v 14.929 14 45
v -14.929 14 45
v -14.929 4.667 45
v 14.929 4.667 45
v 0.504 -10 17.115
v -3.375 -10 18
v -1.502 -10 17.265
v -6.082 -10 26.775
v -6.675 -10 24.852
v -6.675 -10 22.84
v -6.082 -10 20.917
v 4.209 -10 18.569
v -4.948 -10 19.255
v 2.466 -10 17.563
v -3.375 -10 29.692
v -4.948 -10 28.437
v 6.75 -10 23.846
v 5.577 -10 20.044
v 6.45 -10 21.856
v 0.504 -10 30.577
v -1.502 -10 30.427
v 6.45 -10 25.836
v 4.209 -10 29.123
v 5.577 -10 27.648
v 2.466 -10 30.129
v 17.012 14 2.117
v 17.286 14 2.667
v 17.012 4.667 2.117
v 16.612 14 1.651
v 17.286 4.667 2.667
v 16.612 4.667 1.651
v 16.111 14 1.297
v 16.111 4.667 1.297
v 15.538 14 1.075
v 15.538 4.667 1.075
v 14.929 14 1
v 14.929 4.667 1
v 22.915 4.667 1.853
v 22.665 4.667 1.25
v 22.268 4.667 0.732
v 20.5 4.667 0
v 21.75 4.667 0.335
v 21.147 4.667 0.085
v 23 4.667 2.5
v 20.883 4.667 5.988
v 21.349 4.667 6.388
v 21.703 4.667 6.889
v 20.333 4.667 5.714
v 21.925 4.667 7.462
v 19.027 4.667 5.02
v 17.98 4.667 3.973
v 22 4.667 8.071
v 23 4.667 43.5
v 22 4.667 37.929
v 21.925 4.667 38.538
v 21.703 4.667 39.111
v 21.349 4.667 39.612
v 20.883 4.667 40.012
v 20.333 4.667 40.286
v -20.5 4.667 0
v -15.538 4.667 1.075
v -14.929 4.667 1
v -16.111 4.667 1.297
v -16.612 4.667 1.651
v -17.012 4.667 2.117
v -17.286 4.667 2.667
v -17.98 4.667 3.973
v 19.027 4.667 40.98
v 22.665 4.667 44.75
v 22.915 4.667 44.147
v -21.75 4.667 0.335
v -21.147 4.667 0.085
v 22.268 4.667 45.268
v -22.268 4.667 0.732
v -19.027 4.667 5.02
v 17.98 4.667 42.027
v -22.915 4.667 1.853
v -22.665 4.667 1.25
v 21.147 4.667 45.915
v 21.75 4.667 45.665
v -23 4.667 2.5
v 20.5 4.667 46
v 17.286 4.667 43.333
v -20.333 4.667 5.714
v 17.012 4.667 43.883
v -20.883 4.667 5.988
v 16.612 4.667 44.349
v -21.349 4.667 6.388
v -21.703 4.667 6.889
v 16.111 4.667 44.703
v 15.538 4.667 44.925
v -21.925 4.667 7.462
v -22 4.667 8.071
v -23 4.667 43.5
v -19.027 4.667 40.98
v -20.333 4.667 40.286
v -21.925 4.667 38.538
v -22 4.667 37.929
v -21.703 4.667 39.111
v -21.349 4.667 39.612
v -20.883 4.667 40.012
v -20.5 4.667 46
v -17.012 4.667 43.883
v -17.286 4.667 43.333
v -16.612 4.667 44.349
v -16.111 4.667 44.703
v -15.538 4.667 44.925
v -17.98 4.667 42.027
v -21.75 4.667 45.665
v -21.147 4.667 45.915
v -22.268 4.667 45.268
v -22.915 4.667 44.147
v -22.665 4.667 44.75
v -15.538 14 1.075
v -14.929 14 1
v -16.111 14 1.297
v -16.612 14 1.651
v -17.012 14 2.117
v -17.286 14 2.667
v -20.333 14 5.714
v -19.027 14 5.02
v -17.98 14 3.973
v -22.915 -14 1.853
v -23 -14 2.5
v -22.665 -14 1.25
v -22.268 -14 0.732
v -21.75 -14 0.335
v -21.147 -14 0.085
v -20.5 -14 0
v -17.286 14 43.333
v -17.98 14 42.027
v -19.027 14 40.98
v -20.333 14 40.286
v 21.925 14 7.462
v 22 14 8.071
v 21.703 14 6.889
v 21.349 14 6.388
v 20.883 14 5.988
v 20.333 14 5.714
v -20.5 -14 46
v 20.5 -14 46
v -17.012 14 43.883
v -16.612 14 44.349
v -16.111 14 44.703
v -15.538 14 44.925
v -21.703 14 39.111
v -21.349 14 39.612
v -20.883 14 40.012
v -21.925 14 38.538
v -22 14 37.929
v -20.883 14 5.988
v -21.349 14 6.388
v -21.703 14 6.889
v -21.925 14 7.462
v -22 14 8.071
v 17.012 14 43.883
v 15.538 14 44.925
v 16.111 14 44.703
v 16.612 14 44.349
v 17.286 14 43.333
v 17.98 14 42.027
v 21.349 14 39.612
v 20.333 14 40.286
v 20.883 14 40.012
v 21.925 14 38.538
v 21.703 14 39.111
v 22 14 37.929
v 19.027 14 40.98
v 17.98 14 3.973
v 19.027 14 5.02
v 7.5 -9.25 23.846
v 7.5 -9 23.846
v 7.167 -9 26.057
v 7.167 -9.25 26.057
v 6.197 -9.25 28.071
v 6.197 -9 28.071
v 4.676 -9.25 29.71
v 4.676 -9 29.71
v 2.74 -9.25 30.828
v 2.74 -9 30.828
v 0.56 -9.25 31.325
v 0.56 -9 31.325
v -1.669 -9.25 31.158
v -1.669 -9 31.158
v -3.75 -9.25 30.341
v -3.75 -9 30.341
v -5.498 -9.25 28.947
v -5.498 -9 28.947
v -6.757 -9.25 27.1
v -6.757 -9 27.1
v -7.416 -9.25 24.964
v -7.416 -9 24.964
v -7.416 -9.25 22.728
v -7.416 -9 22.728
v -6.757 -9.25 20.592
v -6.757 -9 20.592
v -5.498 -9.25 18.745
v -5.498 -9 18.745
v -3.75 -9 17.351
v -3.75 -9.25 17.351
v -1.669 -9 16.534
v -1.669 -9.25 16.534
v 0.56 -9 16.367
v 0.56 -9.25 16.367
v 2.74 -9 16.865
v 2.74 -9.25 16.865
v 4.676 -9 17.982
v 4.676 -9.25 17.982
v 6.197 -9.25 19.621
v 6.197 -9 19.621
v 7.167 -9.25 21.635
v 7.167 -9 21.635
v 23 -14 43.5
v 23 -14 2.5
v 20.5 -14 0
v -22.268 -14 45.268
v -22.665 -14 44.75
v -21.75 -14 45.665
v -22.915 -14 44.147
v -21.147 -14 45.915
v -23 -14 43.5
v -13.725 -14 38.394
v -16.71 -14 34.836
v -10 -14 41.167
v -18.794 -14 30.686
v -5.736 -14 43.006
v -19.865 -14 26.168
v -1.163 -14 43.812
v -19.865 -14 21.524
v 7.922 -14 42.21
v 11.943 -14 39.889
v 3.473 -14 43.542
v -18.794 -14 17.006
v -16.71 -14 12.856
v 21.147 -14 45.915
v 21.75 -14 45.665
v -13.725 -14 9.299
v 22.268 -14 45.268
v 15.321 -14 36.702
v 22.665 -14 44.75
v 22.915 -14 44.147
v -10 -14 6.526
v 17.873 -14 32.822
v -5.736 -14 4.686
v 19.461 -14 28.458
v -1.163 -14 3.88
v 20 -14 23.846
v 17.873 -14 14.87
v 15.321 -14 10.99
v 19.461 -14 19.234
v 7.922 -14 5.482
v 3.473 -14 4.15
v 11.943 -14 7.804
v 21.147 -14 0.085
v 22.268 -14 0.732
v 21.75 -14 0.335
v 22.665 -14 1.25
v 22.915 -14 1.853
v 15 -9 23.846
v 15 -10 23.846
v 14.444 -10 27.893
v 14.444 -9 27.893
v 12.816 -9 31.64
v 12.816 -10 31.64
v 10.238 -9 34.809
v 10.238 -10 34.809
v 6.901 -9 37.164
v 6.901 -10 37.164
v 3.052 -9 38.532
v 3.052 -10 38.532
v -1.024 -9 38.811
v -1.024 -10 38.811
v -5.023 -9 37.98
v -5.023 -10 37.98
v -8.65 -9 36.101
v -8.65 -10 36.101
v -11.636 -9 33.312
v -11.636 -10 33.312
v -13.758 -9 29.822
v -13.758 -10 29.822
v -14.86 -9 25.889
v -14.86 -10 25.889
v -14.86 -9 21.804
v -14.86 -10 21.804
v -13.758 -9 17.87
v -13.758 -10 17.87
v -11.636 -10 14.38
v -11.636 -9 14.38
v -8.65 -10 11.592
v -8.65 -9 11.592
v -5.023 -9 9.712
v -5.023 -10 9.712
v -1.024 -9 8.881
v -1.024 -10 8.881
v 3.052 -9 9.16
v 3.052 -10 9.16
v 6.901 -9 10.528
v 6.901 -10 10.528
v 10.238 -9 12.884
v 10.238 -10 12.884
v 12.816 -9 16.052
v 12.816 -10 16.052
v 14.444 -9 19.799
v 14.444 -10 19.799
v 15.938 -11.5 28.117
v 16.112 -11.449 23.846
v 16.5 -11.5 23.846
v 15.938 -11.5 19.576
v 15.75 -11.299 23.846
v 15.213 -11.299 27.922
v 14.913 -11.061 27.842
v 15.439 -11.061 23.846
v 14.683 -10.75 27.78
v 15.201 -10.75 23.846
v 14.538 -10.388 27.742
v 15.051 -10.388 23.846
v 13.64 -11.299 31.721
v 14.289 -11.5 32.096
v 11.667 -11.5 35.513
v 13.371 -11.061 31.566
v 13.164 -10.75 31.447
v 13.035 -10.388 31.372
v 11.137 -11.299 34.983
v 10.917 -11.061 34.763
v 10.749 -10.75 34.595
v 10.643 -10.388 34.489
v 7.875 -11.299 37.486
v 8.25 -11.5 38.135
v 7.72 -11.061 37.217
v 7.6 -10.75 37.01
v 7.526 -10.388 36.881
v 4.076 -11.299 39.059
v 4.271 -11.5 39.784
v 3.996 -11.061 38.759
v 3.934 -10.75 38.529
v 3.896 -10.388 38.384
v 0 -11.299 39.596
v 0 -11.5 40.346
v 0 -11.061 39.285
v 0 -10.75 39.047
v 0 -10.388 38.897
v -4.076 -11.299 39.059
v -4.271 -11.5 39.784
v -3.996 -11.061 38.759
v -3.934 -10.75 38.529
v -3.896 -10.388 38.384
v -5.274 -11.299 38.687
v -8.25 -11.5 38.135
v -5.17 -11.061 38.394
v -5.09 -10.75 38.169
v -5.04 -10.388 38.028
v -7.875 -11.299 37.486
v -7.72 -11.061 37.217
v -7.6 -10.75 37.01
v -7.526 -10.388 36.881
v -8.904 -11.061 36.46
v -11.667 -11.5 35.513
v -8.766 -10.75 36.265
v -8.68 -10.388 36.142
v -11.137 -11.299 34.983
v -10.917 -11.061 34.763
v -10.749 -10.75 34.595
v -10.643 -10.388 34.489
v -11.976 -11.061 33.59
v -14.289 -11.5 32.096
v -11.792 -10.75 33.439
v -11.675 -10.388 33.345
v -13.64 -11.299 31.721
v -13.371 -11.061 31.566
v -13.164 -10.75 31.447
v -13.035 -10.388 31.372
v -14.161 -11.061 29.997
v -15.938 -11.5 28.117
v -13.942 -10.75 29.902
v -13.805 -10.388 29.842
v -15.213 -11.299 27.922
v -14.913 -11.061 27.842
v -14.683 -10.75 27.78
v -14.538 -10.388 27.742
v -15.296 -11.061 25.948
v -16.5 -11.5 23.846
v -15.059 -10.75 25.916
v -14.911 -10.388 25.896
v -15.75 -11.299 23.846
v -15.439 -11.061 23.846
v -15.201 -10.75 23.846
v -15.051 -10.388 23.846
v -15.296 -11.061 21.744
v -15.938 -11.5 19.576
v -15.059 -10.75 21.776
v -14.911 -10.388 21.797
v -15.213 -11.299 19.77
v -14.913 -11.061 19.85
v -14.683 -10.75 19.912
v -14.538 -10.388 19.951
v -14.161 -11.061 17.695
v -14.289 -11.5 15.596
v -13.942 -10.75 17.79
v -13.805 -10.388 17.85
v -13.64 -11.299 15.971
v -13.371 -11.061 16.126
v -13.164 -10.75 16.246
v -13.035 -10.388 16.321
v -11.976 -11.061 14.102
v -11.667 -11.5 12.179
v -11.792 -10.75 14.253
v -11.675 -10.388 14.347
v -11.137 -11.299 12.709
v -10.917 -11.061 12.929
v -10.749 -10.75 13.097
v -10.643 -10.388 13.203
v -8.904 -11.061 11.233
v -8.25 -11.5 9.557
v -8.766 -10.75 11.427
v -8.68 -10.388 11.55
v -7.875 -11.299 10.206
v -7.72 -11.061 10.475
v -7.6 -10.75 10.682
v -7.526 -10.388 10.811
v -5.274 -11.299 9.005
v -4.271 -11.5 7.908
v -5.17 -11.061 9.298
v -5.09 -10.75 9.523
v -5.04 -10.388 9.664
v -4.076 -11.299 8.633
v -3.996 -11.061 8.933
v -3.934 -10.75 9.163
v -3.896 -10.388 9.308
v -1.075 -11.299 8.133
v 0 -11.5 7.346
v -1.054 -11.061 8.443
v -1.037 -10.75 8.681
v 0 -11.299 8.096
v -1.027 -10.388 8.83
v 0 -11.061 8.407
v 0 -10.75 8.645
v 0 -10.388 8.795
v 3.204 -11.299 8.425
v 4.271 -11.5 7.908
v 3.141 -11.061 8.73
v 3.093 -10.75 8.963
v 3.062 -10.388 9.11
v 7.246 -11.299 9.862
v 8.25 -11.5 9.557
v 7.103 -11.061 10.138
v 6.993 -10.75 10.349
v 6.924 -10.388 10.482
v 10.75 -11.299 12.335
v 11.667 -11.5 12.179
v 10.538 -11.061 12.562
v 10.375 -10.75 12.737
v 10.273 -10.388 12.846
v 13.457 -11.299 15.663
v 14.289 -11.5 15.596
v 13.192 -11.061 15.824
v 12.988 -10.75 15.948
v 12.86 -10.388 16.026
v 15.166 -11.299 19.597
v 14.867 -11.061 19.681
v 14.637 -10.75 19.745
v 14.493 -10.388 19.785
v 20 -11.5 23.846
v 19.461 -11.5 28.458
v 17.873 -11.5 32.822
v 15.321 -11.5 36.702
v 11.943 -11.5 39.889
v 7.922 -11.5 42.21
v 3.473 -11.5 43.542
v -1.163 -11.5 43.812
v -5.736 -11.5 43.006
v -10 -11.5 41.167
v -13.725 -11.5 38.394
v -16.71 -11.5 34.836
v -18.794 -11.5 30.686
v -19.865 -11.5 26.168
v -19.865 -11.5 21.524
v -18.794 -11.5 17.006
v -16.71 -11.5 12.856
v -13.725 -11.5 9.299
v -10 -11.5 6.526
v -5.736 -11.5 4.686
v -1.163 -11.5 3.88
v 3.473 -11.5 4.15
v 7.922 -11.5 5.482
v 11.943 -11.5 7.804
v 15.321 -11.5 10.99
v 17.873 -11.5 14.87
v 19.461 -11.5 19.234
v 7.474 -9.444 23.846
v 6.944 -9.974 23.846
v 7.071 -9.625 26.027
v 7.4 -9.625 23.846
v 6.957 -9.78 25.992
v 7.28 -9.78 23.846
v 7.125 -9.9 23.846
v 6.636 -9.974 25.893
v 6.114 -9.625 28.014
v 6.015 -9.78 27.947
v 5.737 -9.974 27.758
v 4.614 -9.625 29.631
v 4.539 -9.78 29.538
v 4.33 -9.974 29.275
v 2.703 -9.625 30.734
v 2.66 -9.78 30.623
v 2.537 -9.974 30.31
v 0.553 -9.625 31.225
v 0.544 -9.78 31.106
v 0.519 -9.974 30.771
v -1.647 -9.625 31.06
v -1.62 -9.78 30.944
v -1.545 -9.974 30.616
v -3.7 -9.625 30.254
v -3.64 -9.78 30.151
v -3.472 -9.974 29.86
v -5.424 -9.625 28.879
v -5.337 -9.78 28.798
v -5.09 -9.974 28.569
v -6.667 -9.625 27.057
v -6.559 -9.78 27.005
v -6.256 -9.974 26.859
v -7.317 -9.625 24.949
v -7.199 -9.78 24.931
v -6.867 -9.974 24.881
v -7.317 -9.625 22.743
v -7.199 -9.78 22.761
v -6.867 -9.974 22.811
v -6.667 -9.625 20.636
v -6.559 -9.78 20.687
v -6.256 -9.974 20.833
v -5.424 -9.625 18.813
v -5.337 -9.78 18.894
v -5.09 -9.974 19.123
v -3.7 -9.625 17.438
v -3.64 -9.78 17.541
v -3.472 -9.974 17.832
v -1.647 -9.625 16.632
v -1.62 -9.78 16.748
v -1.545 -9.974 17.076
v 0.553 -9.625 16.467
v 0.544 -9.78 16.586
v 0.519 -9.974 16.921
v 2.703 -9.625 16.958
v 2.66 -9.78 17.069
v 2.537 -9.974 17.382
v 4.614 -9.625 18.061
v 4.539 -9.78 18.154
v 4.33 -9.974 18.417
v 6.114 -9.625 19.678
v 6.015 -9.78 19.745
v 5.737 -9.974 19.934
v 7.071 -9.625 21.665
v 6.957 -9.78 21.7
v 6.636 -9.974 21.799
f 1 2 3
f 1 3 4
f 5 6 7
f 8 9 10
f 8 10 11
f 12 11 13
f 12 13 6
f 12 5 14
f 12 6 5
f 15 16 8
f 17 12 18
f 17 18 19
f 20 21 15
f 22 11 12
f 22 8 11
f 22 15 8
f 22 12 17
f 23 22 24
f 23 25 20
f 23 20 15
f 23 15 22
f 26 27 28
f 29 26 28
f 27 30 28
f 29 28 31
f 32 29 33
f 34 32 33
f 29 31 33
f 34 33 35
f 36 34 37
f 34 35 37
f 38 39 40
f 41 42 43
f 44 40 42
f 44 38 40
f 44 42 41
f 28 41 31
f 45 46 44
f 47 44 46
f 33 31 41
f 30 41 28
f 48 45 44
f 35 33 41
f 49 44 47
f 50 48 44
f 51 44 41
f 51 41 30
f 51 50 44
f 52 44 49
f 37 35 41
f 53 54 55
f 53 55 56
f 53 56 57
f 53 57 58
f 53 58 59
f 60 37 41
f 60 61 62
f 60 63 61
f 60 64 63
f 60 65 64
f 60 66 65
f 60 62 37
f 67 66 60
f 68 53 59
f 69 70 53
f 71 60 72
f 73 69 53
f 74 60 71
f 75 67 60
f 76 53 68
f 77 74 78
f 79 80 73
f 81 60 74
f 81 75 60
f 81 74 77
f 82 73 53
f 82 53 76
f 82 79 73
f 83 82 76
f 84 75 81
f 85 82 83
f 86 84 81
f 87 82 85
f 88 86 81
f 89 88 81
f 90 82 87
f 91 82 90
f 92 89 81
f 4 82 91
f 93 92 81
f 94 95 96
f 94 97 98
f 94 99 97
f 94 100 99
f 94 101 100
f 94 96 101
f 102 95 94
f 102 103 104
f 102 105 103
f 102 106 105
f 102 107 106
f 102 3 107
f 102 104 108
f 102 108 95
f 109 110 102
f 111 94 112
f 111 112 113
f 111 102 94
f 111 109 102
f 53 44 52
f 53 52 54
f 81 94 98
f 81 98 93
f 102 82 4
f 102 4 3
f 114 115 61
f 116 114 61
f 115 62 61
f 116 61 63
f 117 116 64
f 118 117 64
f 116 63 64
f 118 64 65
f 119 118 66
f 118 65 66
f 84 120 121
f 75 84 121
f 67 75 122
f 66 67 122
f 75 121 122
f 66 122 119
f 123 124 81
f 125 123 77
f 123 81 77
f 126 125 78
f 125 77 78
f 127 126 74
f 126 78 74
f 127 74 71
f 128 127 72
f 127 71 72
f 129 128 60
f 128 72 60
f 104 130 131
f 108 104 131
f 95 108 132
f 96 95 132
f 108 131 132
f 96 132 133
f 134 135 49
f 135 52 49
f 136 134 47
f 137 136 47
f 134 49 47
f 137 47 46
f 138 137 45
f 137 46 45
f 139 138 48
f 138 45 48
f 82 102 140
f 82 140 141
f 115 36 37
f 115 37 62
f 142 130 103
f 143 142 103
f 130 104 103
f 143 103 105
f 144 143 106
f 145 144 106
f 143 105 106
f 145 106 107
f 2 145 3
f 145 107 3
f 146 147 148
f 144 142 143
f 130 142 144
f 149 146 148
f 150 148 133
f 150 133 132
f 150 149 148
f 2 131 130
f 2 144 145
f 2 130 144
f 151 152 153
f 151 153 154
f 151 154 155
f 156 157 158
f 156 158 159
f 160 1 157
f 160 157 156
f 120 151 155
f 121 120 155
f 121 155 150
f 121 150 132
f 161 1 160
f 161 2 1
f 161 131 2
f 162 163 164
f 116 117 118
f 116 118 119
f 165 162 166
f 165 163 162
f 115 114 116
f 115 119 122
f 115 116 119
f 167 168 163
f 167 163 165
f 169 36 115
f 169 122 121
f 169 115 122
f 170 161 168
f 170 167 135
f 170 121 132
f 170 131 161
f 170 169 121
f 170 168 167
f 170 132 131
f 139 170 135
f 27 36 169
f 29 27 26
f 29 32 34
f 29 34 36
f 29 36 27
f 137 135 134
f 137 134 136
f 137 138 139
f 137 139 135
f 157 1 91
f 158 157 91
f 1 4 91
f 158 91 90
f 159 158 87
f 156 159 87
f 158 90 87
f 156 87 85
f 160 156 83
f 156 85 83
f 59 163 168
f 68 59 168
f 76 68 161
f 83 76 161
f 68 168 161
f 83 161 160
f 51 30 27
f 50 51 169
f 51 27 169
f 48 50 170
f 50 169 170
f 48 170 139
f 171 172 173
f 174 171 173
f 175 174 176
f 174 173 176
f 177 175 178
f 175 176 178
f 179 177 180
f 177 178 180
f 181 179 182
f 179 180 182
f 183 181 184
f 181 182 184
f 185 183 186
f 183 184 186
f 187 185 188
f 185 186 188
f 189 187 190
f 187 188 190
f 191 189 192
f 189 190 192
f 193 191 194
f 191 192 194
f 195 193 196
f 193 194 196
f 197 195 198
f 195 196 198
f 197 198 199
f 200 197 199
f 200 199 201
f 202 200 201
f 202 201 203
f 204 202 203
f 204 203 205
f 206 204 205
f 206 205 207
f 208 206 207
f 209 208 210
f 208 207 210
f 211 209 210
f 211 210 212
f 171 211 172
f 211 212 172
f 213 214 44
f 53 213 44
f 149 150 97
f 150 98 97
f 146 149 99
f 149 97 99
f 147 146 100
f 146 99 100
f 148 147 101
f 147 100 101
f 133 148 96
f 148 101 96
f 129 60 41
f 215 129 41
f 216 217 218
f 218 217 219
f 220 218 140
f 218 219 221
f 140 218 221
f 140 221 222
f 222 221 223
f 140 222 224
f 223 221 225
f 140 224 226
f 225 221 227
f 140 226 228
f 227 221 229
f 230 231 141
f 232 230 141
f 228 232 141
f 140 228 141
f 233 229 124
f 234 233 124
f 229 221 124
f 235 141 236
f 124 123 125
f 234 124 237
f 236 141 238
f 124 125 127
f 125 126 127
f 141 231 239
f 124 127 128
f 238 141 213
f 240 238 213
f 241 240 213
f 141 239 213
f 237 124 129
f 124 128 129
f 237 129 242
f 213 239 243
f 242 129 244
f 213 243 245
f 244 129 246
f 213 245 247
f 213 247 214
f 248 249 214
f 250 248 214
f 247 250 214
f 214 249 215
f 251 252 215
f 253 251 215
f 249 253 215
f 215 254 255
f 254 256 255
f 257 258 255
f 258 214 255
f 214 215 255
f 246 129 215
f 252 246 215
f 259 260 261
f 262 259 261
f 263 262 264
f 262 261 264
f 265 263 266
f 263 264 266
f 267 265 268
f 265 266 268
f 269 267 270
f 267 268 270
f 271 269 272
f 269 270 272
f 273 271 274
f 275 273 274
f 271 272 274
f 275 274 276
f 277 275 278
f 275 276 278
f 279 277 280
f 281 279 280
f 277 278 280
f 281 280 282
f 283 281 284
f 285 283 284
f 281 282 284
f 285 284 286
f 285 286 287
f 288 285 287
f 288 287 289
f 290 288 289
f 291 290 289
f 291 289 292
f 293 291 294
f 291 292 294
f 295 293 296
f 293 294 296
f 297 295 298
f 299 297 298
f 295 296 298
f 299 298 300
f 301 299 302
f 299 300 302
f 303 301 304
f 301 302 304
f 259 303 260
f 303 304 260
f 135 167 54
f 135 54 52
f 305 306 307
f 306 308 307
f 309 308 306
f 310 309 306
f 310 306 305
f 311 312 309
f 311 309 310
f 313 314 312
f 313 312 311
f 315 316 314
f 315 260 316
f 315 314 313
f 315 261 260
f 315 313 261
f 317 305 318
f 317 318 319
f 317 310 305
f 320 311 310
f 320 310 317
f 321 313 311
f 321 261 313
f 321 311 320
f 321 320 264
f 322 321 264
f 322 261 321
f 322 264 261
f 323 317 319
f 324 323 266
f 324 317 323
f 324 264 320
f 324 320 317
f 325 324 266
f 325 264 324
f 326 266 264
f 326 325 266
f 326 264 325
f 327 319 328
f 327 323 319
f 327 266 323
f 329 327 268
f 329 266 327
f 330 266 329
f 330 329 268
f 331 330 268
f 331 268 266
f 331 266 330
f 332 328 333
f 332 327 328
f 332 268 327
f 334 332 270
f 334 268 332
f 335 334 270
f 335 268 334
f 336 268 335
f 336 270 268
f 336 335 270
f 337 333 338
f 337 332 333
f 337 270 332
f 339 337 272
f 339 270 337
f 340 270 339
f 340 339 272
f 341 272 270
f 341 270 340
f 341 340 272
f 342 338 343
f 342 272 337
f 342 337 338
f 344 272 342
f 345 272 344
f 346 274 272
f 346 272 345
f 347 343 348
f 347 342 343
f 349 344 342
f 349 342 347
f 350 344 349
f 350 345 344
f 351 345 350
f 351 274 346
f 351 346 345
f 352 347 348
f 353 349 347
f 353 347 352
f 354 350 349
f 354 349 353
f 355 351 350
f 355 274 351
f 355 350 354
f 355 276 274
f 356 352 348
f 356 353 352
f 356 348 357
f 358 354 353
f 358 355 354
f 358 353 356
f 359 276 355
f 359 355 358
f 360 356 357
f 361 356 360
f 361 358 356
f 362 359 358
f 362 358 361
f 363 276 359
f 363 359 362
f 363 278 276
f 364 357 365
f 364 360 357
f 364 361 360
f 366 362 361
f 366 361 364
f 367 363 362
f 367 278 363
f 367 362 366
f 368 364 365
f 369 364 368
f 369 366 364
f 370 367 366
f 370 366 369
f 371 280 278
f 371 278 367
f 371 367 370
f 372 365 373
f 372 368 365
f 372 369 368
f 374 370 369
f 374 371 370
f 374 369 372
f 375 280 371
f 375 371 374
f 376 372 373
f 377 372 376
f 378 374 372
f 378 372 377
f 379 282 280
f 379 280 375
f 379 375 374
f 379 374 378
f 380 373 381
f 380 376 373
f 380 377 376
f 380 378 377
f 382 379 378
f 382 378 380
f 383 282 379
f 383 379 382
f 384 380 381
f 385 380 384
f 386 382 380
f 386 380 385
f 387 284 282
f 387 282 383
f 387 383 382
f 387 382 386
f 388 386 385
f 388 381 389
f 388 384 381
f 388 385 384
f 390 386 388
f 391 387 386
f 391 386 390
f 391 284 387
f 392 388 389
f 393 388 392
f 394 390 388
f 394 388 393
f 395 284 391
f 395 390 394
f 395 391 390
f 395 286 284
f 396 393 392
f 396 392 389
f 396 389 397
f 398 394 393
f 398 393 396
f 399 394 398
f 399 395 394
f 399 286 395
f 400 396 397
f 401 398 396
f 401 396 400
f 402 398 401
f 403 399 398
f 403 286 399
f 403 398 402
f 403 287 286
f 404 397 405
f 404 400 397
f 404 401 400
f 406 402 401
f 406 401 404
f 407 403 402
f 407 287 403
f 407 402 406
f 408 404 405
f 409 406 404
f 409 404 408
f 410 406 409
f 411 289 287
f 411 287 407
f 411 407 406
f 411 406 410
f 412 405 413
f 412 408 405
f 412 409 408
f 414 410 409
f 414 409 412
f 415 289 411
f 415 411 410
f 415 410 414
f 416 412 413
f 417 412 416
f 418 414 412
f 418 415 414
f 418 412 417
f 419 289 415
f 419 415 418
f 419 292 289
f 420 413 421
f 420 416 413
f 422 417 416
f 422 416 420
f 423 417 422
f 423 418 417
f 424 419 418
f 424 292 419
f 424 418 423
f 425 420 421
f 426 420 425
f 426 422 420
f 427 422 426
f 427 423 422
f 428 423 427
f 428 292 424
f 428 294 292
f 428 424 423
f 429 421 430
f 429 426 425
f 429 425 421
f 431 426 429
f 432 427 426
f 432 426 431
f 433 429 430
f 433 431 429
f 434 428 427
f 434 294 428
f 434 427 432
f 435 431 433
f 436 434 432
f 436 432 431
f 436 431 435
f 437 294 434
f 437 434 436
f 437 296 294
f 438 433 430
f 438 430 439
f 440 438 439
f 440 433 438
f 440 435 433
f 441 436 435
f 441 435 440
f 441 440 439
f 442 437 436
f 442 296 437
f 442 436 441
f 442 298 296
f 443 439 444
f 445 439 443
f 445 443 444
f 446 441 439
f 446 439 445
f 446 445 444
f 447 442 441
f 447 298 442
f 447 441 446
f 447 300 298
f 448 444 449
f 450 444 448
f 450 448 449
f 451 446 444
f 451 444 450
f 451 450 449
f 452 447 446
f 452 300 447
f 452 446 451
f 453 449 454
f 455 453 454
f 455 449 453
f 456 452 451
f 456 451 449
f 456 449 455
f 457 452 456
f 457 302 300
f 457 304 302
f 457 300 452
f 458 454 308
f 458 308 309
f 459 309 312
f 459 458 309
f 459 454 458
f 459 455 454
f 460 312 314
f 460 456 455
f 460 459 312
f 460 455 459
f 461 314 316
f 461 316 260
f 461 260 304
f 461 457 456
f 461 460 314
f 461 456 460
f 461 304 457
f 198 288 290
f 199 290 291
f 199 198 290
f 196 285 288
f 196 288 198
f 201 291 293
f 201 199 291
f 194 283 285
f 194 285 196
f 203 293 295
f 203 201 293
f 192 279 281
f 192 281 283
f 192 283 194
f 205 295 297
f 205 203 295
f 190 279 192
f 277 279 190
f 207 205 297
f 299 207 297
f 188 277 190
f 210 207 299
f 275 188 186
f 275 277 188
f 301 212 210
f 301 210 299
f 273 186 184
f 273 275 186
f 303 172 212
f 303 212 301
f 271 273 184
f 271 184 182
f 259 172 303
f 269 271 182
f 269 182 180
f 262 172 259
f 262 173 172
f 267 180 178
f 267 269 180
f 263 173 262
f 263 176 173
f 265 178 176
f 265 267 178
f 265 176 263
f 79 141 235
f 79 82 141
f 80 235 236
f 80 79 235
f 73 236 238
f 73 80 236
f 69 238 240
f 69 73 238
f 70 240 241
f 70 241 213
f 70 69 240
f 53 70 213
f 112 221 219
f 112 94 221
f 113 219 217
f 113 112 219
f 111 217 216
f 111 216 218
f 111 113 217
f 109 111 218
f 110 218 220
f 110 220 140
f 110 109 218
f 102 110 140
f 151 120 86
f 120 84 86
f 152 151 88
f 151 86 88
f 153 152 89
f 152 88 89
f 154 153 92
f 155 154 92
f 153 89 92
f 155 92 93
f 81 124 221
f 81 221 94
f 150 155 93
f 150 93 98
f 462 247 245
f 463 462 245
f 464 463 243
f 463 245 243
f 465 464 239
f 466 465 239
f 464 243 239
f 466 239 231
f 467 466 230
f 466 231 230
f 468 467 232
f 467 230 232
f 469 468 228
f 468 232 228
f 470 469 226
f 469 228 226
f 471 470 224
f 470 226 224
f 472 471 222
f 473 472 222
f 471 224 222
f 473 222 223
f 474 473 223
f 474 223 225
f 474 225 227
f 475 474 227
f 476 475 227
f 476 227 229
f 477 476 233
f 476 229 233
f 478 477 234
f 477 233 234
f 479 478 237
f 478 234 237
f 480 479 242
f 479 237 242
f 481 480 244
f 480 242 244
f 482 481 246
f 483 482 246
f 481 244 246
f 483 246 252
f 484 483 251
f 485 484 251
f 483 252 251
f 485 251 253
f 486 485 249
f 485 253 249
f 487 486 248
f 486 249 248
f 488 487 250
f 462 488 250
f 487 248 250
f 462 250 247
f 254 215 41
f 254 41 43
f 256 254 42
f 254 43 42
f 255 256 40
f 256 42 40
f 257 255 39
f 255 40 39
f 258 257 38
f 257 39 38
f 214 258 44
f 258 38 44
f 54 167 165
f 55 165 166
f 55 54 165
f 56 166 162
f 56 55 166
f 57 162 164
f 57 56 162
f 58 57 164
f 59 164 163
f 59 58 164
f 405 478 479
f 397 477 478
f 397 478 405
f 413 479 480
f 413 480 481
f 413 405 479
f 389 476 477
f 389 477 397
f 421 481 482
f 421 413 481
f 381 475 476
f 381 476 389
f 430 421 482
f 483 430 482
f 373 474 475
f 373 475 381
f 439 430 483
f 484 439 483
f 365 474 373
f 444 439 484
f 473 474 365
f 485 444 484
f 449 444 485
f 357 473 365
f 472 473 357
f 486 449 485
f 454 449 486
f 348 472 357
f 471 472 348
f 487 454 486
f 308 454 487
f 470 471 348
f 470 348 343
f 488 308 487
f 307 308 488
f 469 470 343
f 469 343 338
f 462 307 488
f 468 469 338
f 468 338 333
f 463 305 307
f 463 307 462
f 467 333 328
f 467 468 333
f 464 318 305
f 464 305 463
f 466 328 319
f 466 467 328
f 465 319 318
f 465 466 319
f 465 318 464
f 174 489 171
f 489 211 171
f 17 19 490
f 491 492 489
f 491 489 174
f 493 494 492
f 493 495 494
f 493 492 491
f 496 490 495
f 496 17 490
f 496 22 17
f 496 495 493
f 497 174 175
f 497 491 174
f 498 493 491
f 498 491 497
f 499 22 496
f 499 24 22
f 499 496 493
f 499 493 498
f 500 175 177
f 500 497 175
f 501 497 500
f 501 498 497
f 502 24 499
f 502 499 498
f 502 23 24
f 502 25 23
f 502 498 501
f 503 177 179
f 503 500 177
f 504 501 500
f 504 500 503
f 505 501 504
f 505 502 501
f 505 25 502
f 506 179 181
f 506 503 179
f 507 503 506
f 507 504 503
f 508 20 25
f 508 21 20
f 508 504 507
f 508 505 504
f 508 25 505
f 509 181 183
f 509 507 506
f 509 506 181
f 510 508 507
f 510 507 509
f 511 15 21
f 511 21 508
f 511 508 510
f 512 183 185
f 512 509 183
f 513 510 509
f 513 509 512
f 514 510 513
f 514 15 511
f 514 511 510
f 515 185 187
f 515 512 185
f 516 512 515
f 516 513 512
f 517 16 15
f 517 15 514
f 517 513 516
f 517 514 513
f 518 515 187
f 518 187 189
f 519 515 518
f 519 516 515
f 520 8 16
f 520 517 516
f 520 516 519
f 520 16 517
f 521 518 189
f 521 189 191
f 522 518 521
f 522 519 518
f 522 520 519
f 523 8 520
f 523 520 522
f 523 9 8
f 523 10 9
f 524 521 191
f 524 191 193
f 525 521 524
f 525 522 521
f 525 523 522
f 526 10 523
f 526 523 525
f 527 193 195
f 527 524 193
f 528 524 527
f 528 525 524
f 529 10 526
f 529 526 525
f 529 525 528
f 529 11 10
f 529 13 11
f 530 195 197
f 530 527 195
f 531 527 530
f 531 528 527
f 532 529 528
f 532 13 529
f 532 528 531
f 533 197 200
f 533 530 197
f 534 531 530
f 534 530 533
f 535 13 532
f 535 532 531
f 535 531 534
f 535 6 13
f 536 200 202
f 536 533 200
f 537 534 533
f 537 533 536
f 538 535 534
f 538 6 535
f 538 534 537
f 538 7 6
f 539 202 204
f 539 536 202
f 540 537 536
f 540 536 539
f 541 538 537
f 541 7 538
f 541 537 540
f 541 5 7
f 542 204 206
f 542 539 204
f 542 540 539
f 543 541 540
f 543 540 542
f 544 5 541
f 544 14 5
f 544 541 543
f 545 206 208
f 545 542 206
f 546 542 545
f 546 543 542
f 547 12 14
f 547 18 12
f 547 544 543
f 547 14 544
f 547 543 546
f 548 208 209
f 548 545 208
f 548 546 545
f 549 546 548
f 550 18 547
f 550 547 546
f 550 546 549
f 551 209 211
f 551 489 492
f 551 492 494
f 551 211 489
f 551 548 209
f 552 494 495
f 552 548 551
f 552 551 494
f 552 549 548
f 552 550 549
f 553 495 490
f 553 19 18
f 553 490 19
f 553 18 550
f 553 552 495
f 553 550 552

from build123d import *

# Parameters (mm, degrees)
SKETCH_W        = 46
SKETCH_H        = 28
PAD_DEPTH       = 46
SKETCH001_W     = 46
SKETCH001_H     = 46
POCKET_DEPTH    = 9.333333
FILLET_R        = 2.5
SKETCH002_R     = 20
POCKET001_DEPTH = 2.5
SKETCH003_R     = 15
POCKET002_DEPTH = 2.5
SKETCH004_R     = 7.5
PAD001_DEPTH    = 1
FILLET001_R     = 1.5
FILLET002_R     = 0.75


with BuildPart() as part:
    # Sketch → Pad (new body)
    with BuildSketch(Plane.XY):
        Rectangle(SKETCH_W, SKETCH_H)
    extrude(amount=PAD_DEPTH)

    # Sketch001 (on Face4 of Pad) → Pocket (cut)
    with BuildSketch(Plane(origin=(0, 14, 0), x_dir=(-1, 0, 0), z_dir=(0, 1, 0))):
        with Locations((0, 23)):
            Rectangle(SKETCH001_W, SKETCH001_H)
        with BuildLine():
            Line((-22, 40), (-22, 6))
            ThreePointArc((-17, 1), (-18.464466, 4.535534), (-22, 6))
            Line((-17, 1), (17, 1))
            ThreePointArc((22, 6), (18.464466, 4.535534), (17, 1))
            Line((22, 6), (22, 40))
            ThreePointArc((17, 45), (18.464466, 41.464466), (22, 40))
            Line((17, 45), (-17, 45))
            ThreePointArc((-22, 40), (-18.464466, 41.464466), (-17, 45))
        make_face(mode=Mode.SUBTRACT)
    extrude(amount=-POCKET_DEPTH, mode=Mode.SUBTRACT)

    # Fillet
    fillet_edges = [part.edges().sort_by_distance(p)[0] for p in [
        (23, -4.666666, 46),
        (-23, -4.666666, 46),
        (-23, -4.666666, 0),
        (23, -4.666666, 0),
        (-22, 9.333334, 6),
        (-17, 9.333334, 1),
        (17, 9.333334, 1),
        (22, 9.333334, 6),
        (22, 9.333334, 40),
        (17, 9.333334, 45),
        (-17, 9.333334, 45),
        (-22, 9.333334, 40),
    ]]
    fillet(fillet_edges, radius=FILLET_R)

    # Sketch002 (on Face2 of Fillet) → Pocket001 (cut)
    with BuildSketch(Plane.XZ.offset(14)):
        with Locations((0, 23.846073)):
            Circle(SKETCH002_R)
    extrude(amount=-POCKET001_DEPTH, mode=Mode.SUBTRACT)

    # Sketch003 (on Face28 of Pocket001) → Pocket002 (cut)
    with BuildSketch(Plane.XZ.offset(11.5)):
        with Locations((0, 23.846073)):
            Circle(SKETCH003_R)
    extrude(amount=-POCKET002_DEPTH, mode=Mode.SUBTRACT)

    # Sketch004 (on Face31 of Pocket002) → Pad001 (join)
    with BuildSketch(Plane.XZ.offset(9)):
        with Locations((0, 23.846073)):
            Circle(SKETCH004_R)
    extrude(amount=PAD001_DEPTH)

    # Fillet001
    fillet001_edges = [part.edges().sort_by_distance(p)[0] for p in [
        (-15, -11.5, 23.846073),
    ]]
    fillet(fillet001_edges, radius=FILLET001_R)

    # Fillet002
    fillet002_edges = [part.edges().sort_by_distance(p)[0] for p in [
        (-7.5, -10, 23.846073),
    ]]
    fillet(fillet002_edges, radius=FILLET002_R)


solid = part.part
